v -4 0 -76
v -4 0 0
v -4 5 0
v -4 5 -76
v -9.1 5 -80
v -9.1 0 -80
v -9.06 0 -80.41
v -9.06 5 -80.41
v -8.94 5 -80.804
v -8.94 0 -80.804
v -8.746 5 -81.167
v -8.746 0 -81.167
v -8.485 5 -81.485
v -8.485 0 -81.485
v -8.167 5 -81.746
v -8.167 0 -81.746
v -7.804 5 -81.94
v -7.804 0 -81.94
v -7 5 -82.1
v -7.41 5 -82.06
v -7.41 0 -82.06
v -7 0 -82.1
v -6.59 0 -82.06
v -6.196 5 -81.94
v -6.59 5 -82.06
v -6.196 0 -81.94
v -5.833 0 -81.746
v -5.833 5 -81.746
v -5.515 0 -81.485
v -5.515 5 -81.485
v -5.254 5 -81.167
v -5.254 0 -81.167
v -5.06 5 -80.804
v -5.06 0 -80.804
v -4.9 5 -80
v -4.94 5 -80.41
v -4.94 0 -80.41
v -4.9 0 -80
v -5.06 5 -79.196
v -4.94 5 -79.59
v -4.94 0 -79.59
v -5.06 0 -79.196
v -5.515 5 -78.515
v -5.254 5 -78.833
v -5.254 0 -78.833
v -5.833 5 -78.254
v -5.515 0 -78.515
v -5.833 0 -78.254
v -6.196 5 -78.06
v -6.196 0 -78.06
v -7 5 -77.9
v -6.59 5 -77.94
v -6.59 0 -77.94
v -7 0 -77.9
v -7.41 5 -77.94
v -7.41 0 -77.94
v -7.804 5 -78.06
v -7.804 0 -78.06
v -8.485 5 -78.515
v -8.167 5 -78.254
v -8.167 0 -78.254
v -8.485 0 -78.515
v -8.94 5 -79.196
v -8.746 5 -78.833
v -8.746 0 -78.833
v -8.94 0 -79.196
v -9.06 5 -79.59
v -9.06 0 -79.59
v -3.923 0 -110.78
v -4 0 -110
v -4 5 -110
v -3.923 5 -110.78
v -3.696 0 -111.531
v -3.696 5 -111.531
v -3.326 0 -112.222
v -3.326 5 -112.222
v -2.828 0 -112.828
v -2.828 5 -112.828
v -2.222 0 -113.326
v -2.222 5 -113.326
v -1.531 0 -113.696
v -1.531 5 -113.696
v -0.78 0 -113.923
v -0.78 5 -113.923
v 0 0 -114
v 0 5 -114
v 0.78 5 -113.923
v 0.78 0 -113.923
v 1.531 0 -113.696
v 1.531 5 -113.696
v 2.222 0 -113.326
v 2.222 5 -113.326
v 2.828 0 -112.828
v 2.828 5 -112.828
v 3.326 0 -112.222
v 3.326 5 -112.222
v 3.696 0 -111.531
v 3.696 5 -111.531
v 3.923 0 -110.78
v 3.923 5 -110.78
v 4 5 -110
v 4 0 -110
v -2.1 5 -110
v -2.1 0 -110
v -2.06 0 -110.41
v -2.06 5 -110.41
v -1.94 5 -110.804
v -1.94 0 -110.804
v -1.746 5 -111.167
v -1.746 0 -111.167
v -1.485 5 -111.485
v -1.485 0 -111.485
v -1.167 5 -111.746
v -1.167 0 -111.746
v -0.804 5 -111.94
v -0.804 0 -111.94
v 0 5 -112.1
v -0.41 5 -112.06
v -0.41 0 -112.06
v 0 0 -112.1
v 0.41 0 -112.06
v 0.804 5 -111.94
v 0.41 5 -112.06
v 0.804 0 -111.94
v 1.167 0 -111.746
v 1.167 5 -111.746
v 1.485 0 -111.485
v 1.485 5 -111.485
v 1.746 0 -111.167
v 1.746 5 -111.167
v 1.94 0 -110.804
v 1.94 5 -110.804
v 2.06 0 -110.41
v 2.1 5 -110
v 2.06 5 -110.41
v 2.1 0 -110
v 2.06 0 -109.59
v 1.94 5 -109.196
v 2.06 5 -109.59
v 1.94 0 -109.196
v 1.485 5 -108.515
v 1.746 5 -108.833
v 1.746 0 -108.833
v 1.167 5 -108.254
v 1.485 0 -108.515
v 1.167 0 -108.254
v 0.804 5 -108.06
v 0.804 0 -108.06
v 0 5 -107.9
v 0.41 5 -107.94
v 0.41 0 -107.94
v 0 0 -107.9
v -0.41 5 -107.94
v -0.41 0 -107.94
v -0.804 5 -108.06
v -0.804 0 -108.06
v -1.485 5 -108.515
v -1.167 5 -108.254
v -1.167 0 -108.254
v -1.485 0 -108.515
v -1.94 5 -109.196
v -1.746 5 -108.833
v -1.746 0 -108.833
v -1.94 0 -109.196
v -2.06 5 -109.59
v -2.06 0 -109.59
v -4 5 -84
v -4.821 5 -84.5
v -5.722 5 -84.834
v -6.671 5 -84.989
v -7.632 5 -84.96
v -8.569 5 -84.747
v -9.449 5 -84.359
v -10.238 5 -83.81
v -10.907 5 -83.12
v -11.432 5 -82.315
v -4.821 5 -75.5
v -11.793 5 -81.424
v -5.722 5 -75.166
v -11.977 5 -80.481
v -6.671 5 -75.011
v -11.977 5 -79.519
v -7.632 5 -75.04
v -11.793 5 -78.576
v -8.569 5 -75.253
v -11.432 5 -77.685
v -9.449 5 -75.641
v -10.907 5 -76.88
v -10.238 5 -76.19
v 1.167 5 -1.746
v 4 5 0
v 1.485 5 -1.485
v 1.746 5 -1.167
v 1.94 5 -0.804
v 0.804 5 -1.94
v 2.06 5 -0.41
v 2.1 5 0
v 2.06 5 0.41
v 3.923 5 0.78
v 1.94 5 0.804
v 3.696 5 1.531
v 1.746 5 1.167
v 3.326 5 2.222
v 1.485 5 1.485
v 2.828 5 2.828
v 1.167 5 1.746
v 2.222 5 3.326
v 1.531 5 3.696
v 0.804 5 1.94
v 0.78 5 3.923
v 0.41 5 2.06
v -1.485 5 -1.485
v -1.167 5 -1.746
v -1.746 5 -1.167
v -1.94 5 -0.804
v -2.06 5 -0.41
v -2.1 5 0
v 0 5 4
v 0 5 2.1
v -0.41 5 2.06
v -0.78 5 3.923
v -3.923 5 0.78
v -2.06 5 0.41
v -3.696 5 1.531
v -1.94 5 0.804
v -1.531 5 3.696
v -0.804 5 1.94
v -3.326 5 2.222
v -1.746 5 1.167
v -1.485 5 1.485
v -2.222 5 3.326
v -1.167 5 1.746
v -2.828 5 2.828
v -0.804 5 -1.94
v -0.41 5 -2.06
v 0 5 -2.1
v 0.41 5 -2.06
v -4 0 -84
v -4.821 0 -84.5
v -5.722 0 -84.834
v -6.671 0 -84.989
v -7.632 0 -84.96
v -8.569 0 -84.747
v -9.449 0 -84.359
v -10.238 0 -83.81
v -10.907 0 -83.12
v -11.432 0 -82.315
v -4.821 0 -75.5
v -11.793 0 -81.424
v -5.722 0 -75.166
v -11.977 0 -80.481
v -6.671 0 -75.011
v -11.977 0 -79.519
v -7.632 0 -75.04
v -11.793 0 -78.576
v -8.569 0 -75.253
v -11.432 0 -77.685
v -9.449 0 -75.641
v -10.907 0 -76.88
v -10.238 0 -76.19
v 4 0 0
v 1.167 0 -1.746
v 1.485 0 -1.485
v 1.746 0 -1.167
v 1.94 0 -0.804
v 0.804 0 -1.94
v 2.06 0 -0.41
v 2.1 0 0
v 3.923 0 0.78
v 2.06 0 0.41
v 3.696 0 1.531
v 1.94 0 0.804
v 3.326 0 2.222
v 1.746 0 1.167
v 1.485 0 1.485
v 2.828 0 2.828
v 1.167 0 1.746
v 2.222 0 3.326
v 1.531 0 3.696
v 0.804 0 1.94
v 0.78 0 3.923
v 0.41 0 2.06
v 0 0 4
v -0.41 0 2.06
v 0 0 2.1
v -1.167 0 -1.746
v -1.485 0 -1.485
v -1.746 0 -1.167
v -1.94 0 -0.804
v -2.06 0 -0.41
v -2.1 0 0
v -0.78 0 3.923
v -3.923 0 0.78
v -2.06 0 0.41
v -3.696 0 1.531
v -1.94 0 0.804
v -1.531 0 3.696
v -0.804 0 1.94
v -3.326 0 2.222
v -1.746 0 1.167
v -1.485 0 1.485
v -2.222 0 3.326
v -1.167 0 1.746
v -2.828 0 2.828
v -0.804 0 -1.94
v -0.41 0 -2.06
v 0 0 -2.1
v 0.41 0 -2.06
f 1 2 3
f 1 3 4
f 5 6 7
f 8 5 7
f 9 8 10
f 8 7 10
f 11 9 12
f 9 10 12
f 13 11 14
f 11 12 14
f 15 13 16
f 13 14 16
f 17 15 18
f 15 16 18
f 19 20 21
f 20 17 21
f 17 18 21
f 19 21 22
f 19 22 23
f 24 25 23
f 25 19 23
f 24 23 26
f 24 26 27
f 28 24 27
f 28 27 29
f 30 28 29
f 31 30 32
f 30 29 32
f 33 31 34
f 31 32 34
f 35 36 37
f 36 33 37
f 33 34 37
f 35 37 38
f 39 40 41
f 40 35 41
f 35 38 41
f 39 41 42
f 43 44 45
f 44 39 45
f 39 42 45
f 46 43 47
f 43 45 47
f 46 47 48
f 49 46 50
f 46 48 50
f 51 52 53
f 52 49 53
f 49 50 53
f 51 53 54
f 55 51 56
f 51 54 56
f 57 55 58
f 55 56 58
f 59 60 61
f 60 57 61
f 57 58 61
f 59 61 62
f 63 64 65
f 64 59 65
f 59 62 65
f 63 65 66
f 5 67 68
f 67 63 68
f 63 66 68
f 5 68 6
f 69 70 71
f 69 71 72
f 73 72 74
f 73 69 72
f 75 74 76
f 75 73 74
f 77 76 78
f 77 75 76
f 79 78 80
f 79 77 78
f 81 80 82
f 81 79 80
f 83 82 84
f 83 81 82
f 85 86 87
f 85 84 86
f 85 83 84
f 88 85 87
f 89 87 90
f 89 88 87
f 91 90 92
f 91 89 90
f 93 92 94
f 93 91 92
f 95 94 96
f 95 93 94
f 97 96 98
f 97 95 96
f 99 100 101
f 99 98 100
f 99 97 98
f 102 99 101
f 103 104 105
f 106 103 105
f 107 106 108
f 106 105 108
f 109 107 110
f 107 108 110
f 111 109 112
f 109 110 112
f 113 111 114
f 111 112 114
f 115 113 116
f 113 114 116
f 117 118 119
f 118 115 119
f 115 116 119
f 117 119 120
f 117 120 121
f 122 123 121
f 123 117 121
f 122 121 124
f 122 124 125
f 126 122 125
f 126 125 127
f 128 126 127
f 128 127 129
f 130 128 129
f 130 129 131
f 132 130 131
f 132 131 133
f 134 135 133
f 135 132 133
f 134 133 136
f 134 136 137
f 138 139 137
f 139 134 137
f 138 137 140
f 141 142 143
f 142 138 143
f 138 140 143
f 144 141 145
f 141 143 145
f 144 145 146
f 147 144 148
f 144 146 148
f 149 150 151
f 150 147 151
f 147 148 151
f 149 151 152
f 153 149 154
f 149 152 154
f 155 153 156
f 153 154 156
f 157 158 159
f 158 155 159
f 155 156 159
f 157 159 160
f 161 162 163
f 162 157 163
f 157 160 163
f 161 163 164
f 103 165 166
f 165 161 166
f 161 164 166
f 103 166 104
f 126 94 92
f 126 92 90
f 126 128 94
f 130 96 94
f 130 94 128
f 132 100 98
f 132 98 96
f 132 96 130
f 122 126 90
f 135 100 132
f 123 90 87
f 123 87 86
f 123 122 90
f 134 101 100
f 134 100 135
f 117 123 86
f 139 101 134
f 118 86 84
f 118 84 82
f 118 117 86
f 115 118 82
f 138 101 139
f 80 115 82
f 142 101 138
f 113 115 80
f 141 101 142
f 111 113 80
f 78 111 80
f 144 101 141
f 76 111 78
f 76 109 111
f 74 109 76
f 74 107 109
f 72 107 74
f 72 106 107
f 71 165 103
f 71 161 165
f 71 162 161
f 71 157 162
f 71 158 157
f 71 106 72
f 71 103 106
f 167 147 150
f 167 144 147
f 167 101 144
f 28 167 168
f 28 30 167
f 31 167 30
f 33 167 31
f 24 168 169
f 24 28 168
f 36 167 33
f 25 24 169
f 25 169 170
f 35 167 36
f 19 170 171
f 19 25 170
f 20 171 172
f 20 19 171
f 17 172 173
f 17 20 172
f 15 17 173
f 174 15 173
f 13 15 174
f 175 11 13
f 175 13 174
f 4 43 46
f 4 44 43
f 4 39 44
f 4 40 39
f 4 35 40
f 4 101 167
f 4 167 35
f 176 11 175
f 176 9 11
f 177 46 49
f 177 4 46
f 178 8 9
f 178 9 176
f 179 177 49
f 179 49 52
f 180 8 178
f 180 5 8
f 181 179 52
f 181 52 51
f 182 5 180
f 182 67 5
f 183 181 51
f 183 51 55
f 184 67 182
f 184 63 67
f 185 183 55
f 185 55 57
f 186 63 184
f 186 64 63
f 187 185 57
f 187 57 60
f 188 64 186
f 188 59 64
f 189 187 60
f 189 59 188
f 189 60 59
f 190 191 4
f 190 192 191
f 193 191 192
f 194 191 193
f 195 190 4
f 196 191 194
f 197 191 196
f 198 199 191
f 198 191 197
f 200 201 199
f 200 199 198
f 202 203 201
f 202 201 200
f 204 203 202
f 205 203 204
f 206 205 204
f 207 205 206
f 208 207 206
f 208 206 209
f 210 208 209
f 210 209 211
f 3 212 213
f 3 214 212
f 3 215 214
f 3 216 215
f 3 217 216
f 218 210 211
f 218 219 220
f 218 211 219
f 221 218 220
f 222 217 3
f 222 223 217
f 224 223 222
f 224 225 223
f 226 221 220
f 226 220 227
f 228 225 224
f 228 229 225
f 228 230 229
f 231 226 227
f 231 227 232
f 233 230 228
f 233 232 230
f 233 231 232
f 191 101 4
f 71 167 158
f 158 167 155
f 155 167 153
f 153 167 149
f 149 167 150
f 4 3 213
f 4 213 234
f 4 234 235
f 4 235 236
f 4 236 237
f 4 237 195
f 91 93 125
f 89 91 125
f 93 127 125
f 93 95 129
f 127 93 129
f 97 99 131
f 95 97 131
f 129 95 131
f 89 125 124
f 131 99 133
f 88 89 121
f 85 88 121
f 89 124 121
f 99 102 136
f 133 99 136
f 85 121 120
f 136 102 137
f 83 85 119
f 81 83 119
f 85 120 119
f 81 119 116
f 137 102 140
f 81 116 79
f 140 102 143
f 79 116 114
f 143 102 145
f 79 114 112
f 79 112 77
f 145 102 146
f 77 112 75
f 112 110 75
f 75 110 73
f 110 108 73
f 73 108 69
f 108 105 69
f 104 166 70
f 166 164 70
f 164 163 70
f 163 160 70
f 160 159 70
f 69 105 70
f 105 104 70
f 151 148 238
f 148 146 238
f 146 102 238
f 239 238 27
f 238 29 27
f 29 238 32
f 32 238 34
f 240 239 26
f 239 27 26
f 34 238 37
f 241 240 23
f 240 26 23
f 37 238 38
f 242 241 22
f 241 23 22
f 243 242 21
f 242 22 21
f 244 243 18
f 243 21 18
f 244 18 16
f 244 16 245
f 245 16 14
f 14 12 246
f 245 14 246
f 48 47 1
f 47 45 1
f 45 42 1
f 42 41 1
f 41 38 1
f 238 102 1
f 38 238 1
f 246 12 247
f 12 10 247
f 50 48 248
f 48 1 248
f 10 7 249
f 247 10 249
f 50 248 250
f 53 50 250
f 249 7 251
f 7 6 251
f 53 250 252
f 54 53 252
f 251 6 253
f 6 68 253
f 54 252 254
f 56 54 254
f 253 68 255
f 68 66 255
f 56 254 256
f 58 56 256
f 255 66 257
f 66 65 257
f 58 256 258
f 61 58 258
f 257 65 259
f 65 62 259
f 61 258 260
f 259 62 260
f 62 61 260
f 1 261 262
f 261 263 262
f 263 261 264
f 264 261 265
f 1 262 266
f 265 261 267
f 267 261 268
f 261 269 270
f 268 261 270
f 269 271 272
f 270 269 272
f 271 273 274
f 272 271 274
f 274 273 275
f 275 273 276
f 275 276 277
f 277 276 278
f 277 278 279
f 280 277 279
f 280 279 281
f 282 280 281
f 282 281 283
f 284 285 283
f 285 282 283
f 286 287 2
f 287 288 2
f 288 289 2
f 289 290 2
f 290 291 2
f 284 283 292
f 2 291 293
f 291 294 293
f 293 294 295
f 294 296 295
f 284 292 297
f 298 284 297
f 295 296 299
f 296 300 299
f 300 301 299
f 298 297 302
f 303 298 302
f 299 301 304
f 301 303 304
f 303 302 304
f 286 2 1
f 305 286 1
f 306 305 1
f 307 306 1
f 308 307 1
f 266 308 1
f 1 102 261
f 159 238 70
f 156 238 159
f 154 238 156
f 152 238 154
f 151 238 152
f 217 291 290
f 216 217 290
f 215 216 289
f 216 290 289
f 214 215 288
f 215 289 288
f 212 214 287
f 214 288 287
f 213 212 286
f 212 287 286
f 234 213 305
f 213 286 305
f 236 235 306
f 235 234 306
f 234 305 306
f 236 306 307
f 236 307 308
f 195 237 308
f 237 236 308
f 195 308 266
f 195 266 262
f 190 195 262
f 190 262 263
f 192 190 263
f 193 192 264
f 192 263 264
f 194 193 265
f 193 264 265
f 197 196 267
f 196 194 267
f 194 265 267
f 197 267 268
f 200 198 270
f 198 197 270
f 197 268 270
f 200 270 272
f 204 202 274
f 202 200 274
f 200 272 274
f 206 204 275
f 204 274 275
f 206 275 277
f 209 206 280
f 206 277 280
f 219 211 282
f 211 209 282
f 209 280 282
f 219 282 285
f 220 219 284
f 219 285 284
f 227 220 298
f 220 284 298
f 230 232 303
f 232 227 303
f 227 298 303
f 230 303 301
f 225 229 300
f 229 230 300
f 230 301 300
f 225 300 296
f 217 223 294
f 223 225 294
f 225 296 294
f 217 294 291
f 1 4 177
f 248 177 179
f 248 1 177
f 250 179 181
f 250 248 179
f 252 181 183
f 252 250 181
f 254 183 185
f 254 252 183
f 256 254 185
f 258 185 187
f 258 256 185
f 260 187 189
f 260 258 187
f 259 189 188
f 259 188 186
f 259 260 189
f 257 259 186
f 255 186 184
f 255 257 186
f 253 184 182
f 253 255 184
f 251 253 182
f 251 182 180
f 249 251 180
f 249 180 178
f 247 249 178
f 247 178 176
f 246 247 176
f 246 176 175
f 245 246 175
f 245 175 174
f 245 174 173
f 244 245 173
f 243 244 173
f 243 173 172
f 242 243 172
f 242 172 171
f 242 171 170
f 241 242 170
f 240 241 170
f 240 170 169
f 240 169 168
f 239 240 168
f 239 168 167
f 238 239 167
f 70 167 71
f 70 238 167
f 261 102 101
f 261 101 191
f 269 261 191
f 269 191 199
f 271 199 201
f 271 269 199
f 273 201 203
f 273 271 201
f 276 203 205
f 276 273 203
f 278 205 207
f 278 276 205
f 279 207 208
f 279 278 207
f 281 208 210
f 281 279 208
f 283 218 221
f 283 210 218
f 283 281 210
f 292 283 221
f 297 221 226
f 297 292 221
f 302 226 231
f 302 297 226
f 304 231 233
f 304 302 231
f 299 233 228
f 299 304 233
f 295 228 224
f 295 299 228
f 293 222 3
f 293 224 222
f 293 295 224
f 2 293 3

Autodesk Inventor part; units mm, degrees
ref_plane "YZ Plane" through (0, 0, 0) normal (1, 0, 0) x (0, 1, 0)
ref_plane "XZ Plane" through (0, 0, 0) normal (0, 1, 0) x (-1, 0, 0)
ref_plane "XY Plane" through (0, 0, 0) normal (0, 0, 1) x (1, 0, 0)
sketch "Sketch1" plane through (0, 0, 0) normal (0, 1, 0) x (-1, 0, 0)
  line L0 (0, 0) -> (0, -110) construction
  line L1 (4, 0) -> (4, -110)
  line L2 (-4, -110) -> (-4, 0)
  arc A0 (4, 0) -> (-4, 0) centre (0, 0) ccw
  arc A1 (-4, -110) -> (4, -110) centre (0, -110) ccw
  circle A2 centre (0, 0) radius 2.1
  circle A3 centre (0, -110) radius 2.1
  circle A4 centre (7, -80) radius 2.1
  circle A5 centre (7, -80) radius 5
  point P0 (0, -55)
  point P1 (4, -76)
  point P2 (4, -84)
  dimension "d0" = 110
  dimension "d1" = 8
  dimension "d2" = 4.2
  dimension "d3" = 4.2
  dimension "d6" = 4.2
  dimension "d9" = 80
  dimension "d10" = 3
  dimension "d11" = 10
extrude "Extrusion1" add sketch "Sketch1" along normal blind 5
